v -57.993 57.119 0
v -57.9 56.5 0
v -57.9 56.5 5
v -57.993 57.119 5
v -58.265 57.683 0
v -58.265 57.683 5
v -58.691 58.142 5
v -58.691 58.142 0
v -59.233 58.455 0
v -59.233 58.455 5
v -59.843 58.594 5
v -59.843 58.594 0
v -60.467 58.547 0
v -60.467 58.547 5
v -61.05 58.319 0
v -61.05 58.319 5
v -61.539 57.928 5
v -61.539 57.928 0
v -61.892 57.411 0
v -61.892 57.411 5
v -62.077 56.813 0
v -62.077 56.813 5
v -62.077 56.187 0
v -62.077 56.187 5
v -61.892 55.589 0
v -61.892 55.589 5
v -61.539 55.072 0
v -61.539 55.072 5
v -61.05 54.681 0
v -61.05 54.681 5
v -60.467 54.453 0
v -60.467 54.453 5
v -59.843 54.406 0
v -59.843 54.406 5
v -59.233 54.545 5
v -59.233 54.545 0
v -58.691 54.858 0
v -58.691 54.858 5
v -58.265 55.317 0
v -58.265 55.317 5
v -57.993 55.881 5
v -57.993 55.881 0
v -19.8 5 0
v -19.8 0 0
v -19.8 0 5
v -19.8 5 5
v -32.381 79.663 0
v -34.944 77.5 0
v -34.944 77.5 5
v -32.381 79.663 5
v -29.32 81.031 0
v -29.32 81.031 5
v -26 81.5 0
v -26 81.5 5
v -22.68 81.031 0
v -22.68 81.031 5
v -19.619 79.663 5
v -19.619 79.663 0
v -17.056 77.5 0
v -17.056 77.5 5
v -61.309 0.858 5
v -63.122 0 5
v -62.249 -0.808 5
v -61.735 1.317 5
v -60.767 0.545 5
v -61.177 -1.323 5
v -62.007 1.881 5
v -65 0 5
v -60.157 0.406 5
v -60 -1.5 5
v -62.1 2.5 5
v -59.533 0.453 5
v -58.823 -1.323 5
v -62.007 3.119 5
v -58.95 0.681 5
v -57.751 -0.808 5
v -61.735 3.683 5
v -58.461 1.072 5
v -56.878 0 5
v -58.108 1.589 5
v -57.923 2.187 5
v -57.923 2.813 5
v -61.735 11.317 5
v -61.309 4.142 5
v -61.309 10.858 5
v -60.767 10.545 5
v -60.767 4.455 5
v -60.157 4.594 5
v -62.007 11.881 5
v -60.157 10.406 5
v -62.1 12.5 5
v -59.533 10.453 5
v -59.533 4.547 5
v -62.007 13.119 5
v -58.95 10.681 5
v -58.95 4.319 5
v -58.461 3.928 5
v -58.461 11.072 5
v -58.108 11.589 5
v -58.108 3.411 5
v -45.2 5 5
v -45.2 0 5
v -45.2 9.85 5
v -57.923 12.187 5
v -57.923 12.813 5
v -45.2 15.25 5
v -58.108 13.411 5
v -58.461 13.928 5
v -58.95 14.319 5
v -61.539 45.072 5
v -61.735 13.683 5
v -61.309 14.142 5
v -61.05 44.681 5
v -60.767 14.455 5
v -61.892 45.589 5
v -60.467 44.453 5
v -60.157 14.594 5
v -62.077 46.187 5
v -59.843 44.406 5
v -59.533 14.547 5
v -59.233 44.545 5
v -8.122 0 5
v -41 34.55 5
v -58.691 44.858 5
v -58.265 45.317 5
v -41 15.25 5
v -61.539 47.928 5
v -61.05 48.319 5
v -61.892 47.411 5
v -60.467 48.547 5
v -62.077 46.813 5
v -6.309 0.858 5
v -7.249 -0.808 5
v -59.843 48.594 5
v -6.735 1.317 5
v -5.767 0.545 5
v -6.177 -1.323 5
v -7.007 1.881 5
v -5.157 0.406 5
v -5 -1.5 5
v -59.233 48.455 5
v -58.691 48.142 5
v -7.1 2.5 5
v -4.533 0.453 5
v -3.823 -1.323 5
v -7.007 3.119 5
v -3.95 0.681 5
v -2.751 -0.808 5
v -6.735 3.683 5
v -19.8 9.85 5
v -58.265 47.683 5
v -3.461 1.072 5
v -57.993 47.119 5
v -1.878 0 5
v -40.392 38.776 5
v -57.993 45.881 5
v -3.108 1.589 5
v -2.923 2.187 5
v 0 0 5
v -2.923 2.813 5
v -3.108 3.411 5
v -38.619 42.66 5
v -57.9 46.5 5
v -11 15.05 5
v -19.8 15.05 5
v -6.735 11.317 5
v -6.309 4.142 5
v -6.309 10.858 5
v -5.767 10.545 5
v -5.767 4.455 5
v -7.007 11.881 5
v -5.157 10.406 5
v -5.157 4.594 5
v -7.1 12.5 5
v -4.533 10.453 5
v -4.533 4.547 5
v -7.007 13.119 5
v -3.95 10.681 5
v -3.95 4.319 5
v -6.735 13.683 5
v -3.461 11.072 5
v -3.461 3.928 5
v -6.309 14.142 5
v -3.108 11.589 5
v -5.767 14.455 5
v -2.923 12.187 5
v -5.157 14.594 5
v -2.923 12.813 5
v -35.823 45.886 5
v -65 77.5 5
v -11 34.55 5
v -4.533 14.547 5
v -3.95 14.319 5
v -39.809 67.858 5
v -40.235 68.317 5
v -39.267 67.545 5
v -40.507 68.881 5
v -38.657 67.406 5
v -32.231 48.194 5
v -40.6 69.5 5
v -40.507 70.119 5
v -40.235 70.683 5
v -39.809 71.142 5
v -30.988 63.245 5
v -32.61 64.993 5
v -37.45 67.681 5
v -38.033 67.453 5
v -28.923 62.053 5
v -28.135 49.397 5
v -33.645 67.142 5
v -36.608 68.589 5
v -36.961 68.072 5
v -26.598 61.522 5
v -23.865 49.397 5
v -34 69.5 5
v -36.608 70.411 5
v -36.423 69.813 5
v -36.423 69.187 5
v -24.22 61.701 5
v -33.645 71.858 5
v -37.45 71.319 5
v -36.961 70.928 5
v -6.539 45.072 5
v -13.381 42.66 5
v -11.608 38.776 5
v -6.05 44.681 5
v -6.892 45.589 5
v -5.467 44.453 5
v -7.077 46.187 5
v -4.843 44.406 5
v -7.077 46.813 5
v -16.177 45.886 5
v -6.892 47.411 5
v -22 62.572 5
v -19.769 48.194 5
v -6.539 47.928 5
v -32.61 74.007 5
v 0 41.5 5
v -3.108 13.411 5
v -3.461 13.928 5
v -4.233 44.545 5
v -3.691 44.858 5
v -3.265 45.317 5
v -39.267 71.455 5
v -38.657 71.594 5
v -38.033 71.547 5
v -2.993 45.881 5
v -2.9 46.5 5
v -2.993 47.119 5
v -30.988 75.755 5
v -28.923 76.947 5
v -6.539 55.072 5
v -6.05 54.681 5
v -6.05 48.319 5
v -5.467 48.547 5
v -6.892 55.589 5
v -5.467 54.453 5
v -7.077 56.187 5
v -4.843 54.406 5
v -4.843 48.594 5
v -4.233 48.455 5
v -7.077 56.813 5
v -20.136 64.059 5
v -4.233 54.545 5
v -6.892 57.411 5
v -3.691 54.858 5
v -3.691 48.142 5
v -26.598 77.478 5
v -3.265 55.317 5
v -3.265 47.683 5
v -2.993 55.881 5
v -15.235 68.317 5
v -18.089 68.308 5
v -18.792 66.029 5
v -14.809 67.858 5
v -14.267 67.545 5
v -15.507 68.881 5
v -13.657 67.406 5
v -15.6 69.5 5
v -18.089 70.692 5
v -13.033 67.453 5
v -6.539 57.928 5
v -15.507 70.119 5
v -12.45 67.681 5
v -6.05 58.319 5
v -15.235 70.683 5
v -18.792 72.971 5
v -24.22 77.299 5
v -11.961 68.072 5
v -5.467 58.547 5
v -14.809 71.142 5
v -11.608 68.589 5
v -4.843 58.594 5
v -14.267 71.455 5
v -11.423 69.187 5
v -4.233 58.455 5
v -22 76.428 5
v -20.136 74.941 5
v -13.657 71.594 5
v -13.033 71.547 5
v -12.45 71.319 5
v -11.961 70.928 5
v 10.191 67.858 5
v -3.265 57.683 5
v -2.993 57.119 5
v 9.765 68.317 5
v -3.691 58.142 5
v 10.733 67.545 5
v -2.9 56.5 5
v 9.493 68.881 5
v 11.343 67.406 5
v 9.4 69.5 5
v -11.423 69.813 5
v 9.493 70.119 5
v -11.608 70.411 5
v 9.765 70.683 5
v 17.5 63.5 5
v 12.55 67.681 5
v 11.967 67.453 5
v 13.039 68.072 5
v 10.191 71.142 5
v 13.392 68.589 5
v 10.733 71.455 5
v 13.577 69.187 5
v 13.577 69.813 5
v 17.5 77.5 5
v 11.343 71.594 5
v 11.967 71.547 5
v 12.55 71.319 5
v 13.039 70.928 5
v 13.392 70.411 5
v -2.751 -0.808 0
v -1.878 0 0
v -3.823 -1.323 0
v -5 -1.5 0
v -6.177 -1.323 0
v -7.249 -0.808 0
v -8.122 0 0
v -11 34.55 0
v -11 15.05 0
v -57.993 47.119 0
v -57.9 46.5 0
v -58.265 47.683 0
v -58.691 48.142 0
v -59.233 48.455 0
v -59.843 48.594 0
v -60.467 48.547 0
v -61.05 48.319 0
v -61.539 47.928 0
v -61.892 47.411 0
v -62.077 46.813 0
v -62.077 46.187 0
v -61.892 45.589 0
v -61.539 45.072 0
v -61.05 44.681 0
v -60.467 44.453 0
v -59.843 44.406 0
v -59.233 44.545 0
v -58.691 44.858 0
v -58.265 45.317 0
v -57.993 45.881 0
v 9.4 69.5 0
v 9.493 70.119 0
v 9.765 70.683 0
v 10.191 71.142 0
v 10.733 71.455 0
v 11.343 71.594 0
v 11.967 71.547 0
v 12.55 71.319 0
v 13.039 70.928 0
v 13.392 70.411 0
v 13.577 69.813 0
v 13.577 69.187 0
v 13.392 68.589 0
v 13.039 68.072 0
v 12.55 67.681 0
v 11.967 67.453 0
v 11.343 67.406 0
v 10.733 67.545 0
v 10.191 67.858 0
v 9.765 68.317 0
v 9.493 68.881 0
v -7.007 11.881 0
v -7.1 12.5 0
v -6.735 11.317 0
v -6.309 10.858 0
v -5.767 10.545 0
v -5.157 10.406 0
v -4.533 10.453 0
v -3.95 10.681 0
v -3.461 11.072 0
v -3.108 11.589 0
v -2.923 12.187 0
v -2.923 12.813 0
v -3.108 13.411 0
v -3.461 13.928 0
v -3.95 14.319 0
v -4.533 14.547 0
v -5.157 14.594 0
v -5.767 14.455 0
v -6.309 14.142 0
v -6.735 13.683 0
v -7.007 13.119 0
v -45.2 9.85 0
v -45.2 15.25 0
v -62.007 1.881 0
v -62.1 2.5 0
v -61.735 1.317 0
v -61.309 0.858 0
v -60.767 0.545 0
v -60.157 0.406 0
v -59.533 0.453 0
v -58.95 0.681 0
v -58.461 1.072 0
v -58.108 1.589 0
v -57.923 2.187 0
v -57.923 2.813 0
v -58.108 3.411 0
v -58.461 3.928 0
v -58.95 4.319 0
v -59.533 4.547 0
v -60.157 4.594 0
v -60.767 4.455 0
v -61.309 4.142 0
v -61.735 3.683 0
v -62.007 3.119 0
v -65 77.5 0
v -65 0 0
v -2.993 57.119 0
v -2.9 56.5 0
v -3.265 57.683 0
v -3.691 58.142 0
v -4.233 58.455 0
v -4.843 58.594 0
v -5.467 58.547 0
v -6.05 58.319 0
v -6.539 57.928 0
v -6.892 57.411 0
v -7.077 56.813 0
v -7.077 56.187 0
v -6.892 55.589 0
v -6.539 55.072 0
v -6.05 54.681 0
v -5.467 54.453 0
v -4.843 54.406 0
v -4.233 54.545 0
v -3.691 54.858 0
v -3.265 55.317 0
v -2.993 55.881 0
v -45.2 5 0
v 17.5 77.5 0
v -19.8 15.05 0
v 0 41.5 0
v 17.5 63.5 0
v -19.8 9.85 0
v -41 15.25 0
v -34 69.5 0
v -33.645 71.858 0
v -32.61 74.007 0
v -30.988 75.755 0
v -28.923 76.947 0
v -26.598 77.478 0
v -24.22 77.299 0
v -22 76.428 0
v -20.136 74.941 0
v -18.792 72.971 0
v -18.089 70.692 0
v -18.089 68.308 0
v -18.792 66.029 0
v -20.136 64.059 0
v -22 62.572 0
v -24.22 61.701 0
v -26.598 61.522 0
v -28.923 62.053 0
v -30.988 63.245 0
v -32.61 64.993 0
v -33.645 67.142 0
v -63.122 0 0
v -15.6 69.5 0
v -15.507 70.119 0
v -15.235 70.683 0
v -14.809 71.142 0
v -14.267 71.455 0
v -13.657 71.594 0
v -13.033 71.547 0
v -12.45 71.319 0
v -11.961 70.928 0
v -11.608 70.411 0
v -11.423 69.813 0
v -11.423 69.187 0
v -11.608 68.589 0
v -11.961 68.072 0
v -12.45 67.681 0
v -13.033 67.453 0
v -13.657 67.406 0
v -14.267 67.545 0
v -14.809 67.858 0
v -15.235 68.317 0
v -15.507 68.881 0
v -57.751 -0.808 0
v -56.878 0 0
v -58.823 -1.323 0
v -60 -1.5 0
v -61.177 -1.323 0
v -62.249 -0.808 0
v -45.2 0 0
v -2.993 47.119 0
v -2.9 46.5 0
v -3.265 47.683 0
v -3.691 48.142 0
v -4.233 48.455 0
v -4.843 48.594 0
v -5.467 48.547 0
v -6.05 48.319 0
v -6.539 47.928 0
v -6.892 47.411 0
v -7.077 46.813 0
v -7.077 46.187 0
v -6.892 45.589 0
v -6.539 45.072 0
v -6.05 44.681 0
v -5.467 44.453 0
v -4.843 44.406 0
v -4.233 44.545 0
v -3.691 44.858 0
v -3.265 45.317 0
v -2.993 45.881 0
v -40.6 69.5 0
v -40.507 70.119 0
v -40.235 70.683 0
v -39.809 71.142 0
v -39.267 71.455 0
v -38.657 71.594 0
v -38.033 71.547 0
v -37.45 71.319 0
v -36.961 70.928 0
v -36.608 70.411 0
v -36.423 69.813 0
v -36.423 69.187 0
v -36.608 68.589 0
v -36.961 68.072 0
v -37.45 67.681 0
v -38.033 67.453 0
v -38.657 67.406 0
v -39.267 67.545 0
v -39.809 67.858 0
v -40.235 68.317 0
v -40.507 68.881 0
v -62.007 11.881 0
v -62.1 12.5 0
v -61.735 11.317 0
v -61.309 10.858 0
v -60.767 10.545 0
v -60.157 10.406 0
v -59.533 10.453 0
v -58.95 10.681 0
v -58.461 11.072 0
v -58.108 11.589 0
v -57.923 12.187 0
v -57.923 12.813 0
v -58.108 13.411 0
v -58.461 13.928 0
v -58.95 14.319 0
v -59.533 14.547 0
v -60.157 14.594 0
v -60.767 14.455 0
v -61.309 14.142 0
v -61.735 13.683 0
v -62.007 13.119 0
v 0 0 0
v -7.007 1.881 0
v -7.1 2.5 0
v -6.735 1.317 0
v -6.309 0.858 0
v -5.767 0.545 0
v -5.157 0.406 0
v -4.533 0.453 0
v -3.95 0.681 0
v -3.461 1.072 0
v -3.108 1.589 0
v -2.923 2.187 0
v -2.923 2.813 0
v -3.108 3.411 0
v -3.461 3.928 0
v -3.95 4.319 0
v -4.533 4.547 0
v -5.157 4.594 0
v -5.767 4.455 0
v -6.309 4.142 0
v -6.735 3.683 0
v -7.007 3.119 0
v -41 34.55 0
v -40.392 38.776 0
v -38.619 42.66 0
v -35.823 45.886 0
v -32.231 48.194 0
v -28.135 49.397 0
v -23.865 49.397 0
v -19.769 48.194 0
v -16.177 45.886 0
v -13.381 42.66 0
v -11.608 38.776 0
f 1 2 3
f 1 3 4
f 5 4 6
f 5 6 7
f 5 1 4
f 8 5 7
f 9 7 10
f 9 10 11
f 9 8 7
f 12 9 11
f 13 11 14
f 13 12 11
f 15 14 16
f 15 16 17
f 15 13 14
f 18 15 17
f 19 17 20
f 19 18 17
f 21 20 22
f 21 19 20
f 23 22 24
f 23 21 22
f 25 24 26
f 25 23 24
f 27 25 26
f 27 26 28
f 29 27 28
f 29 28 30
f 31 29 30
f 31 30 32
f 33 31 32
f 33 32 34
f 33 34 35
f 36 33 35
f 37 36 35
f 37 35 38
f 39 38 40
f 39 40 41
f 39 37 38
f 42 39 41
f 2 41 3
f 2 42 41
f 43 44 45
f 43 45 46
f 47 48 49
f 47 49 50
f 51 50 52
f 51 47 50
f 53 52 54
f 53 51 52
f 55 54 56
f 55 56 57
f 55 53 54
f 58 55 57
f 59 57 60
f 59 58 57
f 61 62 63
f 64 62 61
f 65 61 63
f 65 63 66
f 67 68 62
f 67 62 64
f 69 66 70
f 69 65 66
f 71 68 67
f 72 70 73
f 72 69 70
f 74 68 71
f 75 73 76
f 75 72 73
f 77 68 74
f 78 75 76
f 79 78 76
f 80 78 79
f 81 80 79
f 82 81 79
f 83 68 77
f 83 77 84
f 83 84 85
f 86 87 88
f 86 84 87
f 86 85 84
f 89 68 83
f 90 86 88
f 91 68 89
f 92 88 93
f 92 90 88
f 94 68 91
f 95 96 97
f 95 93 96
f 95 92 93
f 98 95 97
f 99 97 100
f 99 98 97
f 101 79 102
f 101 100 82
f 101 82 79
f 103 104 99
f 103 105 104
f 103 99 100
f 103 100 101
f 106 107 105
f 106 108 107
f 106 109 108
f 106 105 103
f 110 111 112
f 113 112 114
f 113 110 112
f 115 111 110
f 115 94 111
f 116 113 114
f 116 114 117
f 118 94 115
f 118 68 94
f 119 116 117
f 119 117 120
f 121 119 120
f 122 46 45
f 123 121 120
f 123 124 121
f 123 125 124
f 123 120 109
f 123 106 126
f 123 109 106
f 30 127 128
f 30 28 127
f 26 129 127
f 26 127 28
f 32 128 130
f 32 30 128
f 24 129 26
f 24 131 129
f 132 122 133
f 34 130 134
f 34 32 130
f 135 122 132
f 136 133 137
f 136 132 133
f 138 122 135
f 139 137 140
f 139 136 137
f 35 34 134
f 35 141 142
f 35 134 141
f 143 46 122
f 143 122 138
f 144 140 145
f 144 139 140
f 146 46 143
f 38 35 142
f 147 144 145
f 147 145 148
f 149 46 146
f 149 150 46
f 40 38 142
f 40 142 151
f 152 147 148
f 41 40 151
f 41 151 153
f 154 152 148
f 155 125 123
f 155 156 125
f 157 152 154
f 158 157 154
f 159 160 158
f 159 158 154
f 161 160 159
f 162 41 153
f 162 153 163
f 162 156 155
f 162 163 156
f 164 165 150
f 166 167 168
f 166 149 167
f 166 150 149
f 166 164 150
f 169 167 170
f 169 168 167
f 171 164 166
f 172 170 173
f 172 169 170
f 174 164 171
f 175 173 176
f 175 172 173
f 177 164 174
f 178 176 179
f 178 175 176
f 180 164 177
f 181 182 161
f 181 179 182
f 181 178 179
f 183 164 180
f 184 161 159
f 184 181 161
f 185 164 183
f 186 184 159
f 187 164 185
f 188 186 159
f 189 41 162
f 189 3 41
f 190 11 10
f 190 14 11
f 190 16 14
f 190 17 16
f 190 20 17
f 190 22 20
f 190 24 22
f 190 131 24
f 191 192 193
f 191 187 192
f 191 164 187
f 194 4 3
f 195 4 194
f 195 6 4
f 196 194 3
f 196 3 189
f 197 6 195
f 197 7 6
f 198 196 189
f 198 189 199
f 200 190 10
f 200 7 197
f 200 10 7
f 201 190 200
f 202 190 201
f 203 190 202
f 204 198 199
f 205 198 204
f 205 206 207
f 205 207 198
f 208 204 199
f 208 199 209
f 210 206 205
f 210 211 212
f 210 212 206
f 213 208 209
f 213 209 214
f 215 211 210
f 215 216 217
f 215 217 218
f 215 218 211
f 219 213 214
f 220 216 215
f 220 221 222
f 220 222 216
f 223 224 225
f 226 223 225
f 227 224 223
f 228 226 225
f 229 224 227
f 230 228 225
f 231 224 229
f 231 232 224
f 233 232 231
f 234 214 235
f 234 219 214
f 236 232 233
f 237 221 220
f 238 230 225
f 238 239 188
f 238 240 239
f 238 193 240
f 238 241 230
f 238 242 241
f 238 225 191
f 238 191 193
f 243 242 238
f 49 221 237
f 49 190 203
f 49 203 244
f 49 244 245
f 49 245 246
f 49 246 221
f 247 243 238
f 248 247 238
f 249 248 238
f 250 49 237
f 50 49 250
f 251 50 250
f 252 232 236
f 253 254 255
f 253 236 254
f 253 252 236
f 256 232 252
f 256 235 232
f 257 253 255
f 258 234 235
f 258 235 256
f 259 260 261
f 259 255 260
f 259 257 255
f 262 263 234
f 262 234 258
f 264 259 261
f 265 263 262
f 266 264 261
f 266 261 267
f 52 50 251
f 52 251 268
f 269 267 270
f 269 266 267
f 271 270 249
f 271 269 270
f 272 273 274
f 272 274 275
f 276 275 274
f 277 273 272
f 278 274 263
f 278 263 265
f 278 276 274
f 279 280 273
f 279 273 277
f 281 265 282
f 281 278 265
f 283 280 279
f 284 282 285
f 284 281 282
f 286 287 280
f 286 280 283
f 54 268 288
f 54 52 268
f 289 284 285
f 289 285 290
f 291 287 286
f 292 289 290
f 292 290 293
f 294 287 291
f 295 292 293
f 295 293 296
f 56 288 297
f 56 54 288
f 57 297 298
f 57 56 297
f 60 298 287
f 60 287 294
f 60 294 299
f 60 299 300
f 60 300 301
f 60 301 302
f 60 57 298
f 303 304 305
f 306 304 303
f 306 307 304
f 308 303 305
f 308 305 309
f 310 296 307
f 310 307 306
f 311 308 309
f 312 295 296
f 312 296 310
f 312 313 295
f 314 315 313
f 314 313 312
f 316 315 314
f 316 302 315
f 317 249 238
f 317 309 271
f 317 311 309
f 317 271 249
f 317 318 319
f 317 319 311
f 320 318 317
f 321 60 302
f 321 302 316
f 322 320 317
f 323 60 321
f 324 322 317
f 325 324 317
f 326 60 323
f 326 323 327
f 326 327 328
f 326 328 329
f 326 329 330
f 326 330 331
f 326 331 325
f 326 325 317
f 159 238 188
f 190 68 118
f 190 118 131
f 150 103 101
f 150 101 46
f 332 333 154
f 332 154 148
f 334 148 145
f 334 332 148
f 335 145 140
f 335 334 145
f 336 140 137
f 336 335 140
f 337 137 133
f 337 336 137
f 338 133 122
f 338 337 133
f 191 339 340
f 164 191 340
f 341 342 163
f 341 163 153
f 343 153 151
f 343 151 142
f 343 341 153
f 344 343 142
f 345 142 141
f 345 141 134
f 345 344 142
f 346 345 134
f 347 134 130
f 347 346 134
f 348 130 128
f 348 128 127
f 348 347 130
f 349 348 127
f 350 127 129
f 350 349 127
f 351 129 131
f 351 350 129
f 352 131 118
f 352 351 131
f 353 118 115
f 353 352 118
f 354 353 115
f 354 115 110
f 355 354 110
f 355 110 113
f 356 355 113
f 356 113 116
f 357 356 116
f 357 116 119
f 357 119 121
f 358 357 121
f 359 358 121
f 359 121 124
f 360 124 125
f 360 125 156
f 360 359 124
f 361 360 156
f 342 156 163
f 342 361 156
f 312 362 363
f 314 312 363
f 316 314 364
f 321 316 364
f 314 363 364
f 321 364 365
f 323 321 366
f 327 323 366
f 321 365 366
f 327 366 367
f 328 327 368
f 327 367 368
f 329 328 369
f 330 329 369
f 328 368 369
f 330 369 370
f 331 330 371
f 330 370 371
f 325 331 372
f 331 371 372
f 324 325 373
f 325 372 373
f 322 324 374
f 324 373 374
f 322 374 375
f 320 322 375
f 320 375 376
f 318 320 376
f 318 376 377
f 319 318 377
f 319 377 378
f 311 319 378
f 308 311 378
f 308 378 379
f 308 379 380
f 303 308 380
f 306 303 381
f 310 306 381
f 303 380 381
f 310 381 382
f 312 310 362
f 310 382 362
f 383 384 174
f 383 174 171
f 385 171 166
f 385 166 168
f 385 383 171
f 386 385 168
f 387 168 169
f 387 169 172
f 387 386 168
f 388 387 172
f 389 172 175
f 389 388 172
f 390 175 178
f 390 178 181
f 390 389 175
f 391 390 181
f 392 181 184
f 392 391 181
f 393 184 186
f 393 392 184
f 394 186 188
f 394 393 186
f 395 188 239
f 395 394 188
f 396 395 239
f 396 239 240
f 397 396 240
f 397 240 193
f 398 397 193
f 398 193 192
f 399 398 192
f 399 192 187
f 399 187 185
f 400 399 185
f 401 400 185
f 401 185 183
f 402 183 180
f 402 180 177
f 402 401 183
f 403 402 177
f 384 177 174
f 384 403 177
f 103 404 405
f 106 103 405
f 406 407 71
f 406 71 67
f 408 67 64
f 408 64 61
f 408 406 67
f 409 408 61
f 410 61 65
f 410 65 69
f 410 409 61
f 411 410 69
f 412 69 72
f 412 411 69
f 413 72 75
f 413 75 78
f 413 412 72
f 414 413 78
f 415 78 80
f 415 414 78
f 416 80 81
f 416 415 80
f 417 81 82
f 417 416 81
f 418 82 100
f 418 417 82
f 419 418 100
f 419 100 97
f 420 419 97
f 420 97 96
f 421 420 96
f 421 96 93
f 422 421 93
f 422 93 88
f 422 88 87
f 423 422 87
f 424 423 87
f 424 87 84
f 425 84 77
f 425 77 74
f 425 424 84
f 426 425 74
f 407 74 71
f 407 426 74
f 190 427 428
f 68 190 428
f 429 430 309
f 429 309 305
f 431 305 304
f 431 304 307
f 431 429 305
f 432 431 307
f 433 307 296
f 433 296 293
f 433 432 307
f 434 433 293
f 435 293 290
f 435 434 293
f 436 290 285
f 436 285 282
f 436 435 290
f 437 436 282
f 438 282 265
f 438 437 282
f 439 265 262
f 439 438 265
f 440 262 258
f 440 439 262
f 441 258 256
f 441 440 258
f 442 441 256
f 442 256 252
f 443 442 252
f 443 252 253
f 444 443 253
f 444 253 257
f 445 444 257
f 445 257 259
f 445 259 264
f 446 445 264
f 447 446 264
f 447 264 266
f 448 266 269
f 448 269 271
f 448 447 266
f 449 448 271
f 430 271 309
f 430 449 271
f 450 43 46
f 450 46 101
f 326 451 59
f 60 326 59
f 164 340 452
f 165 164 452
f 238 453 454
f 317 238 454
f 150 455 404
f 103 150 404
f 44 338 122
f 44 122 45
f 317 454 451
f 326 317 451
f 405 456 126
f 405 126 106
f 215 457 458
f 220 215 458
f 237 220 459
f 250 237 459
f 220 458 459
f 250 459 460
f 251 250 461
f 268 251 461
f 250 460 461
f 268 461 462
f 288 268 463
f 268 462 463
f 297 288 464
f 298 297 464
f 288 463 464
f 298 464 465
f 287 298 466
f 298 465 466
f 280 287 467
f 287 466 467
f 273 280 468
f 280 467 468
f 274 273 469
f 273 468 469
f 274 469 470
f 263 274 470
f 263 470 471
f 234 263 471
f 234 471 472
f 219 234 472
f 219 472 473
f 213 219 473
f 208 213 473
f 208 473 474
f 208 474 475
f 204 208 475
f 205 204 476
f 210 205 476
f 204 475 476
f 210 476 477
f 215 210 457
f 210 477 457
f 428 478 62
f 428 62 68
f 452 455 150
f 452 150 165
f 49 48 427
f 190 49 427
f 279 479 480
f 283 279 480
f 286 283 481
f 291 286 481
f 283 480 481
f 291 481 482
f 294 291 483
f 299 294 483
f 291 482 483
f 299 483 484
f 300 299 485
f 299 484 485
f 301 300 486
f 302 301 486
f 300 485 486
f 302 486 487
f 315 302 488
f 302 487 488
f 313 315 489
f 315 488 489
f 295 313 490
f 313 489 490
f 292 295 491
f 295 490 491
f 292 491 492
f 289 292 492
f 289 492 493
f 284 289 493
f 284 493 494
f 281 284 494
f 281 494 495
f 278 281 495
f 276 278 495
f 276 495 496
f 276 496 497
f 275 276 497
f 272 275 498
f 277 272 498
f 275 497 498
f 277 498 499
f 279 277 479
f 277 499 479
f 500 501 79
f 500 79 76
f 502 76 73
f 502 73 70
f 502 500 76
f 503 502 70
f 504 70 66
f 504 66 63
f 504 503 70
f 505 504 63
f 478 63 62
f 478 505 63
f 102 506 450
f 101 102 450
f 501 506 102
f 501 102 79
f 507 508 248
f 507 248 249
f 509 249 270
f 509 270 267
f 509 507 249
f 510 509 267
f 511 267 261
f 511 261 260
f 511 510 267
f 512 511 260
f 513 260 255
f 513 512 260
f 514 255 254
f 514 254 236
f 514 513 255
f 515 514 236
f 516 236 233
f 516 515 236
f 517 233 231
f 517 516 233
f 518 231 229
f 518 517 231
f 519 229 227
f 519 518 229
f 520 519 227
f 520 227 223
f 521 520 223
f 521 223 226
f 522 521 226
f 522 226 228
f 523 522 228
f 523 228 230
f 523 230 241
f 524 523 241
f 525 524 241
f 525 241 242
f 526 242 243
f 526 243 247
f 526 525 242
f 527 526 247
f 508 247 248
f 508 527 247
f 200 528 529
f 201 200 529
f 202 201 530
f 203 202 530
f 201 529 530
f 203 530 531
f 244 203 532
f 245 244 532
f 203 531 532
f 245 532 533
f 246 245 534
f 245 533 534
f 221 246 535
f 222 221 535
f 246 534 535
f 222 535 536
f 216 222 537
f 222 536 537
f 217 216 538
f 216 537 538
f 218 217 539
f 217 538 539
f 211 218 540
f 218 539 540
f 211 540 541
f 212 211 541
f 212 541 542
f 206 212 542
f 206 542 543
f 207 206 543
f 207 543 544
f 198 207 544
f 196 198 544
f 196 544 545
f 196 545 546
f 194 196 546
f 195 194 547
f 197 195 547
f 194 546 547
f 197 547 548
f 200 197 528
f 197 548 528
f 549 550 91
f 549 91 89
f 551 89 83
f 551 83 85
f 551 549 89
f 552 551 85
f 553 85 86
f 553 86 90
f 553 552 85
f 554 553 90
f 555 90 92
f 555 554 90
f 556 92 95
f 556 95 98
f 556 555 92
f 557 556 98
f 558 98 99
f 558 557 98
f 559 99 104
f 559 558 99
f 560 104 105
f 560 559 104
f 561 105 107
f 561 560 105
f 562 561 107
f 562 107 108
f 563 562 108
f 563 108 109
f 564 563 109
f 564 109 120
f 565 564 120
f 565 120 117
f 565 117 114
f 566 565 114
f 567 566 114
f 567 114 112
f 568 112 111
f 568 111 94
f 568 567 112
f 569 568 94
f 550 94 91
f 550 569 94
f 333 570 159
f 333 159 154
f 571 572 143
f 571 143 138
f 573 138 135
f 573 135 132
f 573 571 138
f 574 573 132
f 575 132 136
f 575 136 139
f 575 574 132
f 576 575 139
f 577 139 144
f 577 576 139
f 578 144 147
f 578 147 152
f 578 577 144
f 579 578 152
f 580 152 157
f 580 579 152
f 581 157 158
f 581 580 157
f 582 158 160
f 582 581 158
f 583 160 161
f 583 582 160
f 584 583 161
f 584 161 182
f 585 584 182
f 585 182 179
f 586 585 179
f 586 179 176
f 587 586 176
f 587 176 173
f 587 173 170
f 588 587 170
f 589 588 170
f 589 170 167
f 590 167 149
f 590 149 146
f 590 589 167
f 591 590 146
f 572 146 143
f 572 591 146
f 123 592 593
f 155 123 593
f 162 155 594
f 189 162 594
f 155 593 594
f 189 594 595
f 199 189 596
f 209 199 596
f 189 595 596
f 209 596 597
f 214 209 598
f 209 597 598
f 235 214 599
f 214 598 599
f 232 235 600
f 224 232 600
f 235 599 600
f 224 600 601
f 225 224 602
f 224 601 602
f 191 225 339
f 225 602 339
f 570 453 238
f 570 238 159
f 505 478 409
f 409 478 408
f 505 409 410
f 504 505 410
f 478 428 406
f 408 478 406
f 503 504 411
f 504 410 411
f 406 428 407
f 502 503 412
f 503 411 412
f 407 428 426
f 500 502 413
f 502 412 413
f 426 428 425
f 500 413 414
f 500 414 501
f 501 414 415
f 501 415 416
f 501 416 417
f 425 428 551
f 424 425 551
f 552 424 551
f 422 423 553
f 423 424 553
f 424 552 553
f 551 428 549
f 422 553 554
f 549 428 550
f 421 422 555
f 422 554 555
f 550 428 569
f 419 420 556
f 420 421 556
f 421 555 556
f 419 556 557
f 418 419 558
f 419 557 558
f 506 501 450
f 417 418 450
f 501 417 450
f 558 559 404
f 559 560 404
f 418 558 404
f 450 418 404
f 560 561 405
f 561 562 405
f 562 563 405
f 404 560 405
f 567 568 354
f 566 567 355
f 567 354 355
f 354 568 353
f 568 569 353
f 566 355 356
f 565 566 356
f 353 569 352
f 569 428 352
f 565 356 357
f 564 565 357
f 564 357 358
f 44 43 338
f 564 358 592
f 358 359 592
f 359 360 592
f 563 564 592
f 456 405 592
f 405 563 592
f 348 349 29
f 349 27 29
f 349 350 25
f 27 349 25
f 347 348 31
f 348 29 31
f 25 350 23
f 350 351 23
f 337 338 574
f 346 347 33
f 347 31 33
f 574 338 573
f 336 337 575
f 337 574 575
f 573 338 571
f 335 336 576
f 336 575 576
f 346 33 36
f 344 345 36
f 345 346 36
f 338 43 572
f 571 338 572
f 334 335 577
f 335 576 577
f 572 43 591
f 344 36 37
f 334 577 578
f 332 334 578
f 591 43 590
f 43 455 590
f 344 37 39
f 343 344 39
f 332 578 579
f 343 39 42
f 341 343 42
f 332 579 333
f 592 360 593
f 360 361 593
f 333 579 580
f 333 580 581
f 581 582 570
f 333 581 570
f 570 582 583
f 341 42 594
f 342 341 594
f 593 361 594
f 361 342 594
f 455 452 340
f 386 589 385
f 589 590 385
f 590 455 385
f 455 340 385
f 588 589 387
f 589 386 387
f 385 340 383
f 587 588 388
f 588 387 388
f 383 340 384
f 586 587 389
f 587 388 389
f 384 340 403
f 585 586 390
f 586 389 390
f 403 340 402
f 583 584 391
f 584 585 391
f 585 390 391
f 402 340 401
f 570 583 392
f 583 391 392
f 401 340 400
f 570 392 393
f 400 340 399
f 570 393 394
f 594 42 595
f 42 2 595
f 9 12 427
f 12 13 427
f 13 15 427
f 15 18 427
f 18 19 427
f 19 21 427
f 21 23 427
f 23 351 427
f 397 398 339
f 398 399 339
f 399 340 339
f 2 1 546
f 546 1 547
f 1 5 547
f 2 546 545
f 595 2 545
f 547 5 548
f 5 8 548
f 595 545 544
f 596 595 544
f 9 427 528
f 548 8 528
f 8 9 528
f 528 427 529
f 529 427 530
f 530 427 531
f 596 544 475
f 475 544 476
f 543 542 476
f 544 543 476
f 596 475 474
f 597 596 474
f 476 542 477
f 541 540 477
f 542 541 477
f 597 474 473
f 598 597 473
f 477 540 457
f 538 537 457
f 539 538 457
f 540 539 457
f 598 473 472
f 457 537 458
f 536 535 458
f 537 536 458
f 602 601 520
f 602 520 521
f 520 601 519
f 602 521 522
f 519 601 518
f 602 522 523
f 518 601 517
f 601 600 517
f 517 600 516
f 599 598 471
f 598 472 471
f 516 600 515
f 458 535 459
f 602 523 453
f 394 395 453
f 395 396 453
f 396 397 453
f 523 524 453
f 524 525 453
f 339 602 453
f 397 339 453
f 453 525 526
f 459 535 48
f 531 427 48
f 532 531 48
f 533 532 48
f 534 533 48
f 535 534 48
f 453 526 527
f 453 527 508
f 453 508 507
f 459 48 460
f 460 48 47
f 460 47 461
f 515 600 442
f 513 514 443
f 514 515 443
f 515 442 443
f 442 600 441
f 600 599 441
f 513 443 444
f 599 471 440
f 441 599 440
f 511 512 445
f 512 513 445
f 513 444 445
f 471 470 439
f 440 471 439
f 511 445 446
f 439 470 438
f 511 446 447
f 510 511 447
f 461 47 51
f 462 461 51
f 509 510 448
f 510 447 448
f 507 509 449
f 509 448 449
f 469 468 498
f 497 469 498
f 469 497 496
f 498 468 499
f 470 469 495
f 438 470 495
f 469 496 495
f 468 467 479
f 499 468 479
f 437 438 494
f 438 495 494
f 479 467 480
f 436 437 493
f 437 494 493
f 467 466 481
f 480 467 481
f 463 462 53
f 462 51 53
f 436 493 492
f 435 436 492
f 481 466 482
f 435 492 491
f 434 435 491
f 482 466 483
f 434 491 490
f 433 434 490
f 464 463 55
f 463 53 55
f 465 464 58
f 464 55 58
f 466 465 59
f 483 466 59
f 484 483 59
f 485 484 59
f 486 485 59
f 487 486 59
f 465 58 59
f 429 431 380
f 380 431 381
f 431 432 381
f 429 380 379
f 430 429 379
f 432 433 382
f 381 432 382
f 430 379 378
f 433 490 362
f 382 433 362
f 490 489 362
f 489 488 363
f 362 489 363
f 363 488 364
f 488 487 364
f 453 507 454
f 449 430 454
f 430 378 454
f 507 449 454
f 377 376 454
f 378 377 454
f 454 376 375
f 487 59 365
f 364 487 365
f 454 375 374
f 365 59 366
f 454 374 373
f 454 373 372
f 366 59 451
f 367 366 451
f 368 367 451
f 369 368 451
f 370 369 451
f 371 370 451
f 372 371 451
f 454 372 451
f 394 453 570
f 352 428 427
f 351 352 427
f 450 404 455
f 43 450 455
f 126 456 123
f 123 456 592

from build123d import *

# Parameters (mm, degrees)
SKETCH1_R           = 2.1
SKETCH1_W           = 25
SKETCH1_H           = 5.1
BOSS_EXTRUDE1_DEPTH = 5
CUT_EXTRUDE2_DEPTH  = 5
SKETCH4_R           = 2.1
SKETCH4_R_2         = 4
BOSS_EXTRUDE2_DEPTH = 5
SKETCH5_W           = 25.4
SKETCH5_H           = 5
SKETCH5_H_2         = 5.4
CUT_EXTRUDE3_DEPTH  = 10
BOSS_EXTRUDE3_DEPTH = 5
SKETCH7_R           = 8
CUT_EXTRUDE6_DEPTH  = 5


with BuildPart() as part:
    # Sketch1 → Boss-Extrude1 (new body)
    with BuildSketch(Plane.XY):
        with BuildLine():
            Line((-65, 61.5), (0, 61.5))
            Line((0, 61.5), (0, 0))
            Line((0, 0), (-1.877501001, 0))
            ThreePointArc((-1.877501001, 0), (-5, -1.5), (-8.122498999, 0))
            Line((-8.122498999, 0), (-20, 0))
            Line((-20, 0), (-20, 5))
            Line((-20, 5), (-45, 5))
            Line((-45, 5), (-45, 0))
            Line((-45, 0), (-56.877501001, 0))
            ThreePointArc((-56.877501001, 0), (-60, -1.5), (-63.122498999, 0))
            Line((-63.122498999, 0), (-65, 0))
            Line((-65, 0), (-65, 61.5))
        make_face()
        with Locations((-60, 56.5)):
            Circle(SKETCH1_R, mode=Mode.SUBTRACT)
        with Locations((-5, 56.5)):
            Circle(SKETCH1_R, mode=Mode.SUBTRACT)
        with Locations((-60, 46.5)):
            Circle(SKETCH1_R, mode=Mode.SUBTRACT)
        with Locations((-5, 46.5)):
            Circle(SKETCH1_R, mode=Mode.SUBTRACT)
        with Locations(Location((-5, 12.5, 0), (0, 0, 180))):
            Circle(SKETCH1_R, mode=Mode.SUBTRACT)
        with Locations(Location((-5, 2.5, 0), (0, 0, 180))):
            Circle(SKETCH1_R, mode=Mode.SUBTRACT)
        with Locations(Location((-60, 2.5, 0), (0, 0, 180))):
            Circle(SKETCH1_R, mode=Mode.SUBTRACT)
        with Locations(Location((-60, 12.5, 0), (0, 0, 180))):
            Circle(SKETCH1_R, mode=Mode.SUBTRACT)
        with Locations((-32.5, 12.5)):
            Rectangle(SKETCH1_W, SKETCH1_H, mode=Mode.SUBTRACT)
    extrude(amount=BOSS_EXTRUDE1_DEPTH)

    # Sketch3 → Cut-Extrude2 (cut)
    with BuildSketch(Plane(origin=(0, 0, 0), x_dir=(-1, 0, 0), z_dir=(0, 0, -1))):
        with BuildLine():
            Line((41, 15.05), (41, 34.55))
            ThreePointArc((41, 34.55), (26, 49.55), (11, 34.55))
            Line((11, 34.55), (11, 15.05))
            Line((11, 15.05), (41, 15.05))
        make_face()
    extrude(amount=-CUT_EXTRUDE2_DEPTH, mode=Mode.SUBTRACT)

    # Sketch4 → Boss-Extrude2 (add)
    with BuildSketch(Plane(origin=(0, 0, 0), x_dir=(-1, 0, 0), z_dir=(0, 0, -1))):
        Polygon((0, 41.5), (-17.5, 63.5), (-17.5, 77.5), (65, 77.5), (65, 61.5), (0, 61.5), align=None)
        with Locations((-11.5, 69.5)):
            Circle(SKETCH4_R, mode=Mode.SUBTRACT)
        with Locations((13.5, 69.5)):
            Circle(SKETCH4_R, mode=Mode.SUBTRACT)
        with Locations((26, 69.5)):
            Circle(SKETCH4_R_2, mode=Mode.SUBTRACT)
        with Locations((38.5, 69.5)):
            Circle(SKETCH4_R, mode=Mode.SUBTRACT)
    extrude(amount=-BOSS_EXTRUDE2_DEPTH)

    # Sketch5 → Cut-Extrude3 (cut)
    with BuildSketch(Plane(origin=(0, 0, 0), x_dir=(-1, 0, 0), z_dir=(0, 0, -1))):
        with Locations((32.5, 2.5)):
            Rectangle(SKETCH5_W, SKETCH5_H)
        with Locations((32.5, 12.55)):
            Rectangle(SKETCH5_W, SKETCH5_H_2)
    extrude(amount=-CUT_EXTRUDE3_DEPTH, mode=Mode.SUBTRACT)

    # Sketch6 → Boss-Extrude3 (add)
    with BuildSketch(Plane(origin=(0, 0, 0), x_dir=(-1, 0, 0), z_dir=(0, 0, -1))):
        with BuildLine():
            Line((17.05572809, 77.5), (34.94427191, 77.5))
            ThreePointArc((34.94427191, 77.5), (26, 81.5), (17.05572809, 77.5))
        make_face()
    extrude(amount=-BOSS_EXTRUDE3_DEPTH)

    # Sketch7 → Cut-Extrude6 (cut)
    with BuildSketch(Plane(origin=(0, 0, 0), x_dir=(-1, 0, 0), z_dir=(0, 0, -1))):
        with Locations((26, 69.5)):
            Circle(SKETCH7_R)
    extrude(amount=-CUT_EXTRUDE6_DEPTH, mode=Mode.SUBTRACT)


solid = part.part
